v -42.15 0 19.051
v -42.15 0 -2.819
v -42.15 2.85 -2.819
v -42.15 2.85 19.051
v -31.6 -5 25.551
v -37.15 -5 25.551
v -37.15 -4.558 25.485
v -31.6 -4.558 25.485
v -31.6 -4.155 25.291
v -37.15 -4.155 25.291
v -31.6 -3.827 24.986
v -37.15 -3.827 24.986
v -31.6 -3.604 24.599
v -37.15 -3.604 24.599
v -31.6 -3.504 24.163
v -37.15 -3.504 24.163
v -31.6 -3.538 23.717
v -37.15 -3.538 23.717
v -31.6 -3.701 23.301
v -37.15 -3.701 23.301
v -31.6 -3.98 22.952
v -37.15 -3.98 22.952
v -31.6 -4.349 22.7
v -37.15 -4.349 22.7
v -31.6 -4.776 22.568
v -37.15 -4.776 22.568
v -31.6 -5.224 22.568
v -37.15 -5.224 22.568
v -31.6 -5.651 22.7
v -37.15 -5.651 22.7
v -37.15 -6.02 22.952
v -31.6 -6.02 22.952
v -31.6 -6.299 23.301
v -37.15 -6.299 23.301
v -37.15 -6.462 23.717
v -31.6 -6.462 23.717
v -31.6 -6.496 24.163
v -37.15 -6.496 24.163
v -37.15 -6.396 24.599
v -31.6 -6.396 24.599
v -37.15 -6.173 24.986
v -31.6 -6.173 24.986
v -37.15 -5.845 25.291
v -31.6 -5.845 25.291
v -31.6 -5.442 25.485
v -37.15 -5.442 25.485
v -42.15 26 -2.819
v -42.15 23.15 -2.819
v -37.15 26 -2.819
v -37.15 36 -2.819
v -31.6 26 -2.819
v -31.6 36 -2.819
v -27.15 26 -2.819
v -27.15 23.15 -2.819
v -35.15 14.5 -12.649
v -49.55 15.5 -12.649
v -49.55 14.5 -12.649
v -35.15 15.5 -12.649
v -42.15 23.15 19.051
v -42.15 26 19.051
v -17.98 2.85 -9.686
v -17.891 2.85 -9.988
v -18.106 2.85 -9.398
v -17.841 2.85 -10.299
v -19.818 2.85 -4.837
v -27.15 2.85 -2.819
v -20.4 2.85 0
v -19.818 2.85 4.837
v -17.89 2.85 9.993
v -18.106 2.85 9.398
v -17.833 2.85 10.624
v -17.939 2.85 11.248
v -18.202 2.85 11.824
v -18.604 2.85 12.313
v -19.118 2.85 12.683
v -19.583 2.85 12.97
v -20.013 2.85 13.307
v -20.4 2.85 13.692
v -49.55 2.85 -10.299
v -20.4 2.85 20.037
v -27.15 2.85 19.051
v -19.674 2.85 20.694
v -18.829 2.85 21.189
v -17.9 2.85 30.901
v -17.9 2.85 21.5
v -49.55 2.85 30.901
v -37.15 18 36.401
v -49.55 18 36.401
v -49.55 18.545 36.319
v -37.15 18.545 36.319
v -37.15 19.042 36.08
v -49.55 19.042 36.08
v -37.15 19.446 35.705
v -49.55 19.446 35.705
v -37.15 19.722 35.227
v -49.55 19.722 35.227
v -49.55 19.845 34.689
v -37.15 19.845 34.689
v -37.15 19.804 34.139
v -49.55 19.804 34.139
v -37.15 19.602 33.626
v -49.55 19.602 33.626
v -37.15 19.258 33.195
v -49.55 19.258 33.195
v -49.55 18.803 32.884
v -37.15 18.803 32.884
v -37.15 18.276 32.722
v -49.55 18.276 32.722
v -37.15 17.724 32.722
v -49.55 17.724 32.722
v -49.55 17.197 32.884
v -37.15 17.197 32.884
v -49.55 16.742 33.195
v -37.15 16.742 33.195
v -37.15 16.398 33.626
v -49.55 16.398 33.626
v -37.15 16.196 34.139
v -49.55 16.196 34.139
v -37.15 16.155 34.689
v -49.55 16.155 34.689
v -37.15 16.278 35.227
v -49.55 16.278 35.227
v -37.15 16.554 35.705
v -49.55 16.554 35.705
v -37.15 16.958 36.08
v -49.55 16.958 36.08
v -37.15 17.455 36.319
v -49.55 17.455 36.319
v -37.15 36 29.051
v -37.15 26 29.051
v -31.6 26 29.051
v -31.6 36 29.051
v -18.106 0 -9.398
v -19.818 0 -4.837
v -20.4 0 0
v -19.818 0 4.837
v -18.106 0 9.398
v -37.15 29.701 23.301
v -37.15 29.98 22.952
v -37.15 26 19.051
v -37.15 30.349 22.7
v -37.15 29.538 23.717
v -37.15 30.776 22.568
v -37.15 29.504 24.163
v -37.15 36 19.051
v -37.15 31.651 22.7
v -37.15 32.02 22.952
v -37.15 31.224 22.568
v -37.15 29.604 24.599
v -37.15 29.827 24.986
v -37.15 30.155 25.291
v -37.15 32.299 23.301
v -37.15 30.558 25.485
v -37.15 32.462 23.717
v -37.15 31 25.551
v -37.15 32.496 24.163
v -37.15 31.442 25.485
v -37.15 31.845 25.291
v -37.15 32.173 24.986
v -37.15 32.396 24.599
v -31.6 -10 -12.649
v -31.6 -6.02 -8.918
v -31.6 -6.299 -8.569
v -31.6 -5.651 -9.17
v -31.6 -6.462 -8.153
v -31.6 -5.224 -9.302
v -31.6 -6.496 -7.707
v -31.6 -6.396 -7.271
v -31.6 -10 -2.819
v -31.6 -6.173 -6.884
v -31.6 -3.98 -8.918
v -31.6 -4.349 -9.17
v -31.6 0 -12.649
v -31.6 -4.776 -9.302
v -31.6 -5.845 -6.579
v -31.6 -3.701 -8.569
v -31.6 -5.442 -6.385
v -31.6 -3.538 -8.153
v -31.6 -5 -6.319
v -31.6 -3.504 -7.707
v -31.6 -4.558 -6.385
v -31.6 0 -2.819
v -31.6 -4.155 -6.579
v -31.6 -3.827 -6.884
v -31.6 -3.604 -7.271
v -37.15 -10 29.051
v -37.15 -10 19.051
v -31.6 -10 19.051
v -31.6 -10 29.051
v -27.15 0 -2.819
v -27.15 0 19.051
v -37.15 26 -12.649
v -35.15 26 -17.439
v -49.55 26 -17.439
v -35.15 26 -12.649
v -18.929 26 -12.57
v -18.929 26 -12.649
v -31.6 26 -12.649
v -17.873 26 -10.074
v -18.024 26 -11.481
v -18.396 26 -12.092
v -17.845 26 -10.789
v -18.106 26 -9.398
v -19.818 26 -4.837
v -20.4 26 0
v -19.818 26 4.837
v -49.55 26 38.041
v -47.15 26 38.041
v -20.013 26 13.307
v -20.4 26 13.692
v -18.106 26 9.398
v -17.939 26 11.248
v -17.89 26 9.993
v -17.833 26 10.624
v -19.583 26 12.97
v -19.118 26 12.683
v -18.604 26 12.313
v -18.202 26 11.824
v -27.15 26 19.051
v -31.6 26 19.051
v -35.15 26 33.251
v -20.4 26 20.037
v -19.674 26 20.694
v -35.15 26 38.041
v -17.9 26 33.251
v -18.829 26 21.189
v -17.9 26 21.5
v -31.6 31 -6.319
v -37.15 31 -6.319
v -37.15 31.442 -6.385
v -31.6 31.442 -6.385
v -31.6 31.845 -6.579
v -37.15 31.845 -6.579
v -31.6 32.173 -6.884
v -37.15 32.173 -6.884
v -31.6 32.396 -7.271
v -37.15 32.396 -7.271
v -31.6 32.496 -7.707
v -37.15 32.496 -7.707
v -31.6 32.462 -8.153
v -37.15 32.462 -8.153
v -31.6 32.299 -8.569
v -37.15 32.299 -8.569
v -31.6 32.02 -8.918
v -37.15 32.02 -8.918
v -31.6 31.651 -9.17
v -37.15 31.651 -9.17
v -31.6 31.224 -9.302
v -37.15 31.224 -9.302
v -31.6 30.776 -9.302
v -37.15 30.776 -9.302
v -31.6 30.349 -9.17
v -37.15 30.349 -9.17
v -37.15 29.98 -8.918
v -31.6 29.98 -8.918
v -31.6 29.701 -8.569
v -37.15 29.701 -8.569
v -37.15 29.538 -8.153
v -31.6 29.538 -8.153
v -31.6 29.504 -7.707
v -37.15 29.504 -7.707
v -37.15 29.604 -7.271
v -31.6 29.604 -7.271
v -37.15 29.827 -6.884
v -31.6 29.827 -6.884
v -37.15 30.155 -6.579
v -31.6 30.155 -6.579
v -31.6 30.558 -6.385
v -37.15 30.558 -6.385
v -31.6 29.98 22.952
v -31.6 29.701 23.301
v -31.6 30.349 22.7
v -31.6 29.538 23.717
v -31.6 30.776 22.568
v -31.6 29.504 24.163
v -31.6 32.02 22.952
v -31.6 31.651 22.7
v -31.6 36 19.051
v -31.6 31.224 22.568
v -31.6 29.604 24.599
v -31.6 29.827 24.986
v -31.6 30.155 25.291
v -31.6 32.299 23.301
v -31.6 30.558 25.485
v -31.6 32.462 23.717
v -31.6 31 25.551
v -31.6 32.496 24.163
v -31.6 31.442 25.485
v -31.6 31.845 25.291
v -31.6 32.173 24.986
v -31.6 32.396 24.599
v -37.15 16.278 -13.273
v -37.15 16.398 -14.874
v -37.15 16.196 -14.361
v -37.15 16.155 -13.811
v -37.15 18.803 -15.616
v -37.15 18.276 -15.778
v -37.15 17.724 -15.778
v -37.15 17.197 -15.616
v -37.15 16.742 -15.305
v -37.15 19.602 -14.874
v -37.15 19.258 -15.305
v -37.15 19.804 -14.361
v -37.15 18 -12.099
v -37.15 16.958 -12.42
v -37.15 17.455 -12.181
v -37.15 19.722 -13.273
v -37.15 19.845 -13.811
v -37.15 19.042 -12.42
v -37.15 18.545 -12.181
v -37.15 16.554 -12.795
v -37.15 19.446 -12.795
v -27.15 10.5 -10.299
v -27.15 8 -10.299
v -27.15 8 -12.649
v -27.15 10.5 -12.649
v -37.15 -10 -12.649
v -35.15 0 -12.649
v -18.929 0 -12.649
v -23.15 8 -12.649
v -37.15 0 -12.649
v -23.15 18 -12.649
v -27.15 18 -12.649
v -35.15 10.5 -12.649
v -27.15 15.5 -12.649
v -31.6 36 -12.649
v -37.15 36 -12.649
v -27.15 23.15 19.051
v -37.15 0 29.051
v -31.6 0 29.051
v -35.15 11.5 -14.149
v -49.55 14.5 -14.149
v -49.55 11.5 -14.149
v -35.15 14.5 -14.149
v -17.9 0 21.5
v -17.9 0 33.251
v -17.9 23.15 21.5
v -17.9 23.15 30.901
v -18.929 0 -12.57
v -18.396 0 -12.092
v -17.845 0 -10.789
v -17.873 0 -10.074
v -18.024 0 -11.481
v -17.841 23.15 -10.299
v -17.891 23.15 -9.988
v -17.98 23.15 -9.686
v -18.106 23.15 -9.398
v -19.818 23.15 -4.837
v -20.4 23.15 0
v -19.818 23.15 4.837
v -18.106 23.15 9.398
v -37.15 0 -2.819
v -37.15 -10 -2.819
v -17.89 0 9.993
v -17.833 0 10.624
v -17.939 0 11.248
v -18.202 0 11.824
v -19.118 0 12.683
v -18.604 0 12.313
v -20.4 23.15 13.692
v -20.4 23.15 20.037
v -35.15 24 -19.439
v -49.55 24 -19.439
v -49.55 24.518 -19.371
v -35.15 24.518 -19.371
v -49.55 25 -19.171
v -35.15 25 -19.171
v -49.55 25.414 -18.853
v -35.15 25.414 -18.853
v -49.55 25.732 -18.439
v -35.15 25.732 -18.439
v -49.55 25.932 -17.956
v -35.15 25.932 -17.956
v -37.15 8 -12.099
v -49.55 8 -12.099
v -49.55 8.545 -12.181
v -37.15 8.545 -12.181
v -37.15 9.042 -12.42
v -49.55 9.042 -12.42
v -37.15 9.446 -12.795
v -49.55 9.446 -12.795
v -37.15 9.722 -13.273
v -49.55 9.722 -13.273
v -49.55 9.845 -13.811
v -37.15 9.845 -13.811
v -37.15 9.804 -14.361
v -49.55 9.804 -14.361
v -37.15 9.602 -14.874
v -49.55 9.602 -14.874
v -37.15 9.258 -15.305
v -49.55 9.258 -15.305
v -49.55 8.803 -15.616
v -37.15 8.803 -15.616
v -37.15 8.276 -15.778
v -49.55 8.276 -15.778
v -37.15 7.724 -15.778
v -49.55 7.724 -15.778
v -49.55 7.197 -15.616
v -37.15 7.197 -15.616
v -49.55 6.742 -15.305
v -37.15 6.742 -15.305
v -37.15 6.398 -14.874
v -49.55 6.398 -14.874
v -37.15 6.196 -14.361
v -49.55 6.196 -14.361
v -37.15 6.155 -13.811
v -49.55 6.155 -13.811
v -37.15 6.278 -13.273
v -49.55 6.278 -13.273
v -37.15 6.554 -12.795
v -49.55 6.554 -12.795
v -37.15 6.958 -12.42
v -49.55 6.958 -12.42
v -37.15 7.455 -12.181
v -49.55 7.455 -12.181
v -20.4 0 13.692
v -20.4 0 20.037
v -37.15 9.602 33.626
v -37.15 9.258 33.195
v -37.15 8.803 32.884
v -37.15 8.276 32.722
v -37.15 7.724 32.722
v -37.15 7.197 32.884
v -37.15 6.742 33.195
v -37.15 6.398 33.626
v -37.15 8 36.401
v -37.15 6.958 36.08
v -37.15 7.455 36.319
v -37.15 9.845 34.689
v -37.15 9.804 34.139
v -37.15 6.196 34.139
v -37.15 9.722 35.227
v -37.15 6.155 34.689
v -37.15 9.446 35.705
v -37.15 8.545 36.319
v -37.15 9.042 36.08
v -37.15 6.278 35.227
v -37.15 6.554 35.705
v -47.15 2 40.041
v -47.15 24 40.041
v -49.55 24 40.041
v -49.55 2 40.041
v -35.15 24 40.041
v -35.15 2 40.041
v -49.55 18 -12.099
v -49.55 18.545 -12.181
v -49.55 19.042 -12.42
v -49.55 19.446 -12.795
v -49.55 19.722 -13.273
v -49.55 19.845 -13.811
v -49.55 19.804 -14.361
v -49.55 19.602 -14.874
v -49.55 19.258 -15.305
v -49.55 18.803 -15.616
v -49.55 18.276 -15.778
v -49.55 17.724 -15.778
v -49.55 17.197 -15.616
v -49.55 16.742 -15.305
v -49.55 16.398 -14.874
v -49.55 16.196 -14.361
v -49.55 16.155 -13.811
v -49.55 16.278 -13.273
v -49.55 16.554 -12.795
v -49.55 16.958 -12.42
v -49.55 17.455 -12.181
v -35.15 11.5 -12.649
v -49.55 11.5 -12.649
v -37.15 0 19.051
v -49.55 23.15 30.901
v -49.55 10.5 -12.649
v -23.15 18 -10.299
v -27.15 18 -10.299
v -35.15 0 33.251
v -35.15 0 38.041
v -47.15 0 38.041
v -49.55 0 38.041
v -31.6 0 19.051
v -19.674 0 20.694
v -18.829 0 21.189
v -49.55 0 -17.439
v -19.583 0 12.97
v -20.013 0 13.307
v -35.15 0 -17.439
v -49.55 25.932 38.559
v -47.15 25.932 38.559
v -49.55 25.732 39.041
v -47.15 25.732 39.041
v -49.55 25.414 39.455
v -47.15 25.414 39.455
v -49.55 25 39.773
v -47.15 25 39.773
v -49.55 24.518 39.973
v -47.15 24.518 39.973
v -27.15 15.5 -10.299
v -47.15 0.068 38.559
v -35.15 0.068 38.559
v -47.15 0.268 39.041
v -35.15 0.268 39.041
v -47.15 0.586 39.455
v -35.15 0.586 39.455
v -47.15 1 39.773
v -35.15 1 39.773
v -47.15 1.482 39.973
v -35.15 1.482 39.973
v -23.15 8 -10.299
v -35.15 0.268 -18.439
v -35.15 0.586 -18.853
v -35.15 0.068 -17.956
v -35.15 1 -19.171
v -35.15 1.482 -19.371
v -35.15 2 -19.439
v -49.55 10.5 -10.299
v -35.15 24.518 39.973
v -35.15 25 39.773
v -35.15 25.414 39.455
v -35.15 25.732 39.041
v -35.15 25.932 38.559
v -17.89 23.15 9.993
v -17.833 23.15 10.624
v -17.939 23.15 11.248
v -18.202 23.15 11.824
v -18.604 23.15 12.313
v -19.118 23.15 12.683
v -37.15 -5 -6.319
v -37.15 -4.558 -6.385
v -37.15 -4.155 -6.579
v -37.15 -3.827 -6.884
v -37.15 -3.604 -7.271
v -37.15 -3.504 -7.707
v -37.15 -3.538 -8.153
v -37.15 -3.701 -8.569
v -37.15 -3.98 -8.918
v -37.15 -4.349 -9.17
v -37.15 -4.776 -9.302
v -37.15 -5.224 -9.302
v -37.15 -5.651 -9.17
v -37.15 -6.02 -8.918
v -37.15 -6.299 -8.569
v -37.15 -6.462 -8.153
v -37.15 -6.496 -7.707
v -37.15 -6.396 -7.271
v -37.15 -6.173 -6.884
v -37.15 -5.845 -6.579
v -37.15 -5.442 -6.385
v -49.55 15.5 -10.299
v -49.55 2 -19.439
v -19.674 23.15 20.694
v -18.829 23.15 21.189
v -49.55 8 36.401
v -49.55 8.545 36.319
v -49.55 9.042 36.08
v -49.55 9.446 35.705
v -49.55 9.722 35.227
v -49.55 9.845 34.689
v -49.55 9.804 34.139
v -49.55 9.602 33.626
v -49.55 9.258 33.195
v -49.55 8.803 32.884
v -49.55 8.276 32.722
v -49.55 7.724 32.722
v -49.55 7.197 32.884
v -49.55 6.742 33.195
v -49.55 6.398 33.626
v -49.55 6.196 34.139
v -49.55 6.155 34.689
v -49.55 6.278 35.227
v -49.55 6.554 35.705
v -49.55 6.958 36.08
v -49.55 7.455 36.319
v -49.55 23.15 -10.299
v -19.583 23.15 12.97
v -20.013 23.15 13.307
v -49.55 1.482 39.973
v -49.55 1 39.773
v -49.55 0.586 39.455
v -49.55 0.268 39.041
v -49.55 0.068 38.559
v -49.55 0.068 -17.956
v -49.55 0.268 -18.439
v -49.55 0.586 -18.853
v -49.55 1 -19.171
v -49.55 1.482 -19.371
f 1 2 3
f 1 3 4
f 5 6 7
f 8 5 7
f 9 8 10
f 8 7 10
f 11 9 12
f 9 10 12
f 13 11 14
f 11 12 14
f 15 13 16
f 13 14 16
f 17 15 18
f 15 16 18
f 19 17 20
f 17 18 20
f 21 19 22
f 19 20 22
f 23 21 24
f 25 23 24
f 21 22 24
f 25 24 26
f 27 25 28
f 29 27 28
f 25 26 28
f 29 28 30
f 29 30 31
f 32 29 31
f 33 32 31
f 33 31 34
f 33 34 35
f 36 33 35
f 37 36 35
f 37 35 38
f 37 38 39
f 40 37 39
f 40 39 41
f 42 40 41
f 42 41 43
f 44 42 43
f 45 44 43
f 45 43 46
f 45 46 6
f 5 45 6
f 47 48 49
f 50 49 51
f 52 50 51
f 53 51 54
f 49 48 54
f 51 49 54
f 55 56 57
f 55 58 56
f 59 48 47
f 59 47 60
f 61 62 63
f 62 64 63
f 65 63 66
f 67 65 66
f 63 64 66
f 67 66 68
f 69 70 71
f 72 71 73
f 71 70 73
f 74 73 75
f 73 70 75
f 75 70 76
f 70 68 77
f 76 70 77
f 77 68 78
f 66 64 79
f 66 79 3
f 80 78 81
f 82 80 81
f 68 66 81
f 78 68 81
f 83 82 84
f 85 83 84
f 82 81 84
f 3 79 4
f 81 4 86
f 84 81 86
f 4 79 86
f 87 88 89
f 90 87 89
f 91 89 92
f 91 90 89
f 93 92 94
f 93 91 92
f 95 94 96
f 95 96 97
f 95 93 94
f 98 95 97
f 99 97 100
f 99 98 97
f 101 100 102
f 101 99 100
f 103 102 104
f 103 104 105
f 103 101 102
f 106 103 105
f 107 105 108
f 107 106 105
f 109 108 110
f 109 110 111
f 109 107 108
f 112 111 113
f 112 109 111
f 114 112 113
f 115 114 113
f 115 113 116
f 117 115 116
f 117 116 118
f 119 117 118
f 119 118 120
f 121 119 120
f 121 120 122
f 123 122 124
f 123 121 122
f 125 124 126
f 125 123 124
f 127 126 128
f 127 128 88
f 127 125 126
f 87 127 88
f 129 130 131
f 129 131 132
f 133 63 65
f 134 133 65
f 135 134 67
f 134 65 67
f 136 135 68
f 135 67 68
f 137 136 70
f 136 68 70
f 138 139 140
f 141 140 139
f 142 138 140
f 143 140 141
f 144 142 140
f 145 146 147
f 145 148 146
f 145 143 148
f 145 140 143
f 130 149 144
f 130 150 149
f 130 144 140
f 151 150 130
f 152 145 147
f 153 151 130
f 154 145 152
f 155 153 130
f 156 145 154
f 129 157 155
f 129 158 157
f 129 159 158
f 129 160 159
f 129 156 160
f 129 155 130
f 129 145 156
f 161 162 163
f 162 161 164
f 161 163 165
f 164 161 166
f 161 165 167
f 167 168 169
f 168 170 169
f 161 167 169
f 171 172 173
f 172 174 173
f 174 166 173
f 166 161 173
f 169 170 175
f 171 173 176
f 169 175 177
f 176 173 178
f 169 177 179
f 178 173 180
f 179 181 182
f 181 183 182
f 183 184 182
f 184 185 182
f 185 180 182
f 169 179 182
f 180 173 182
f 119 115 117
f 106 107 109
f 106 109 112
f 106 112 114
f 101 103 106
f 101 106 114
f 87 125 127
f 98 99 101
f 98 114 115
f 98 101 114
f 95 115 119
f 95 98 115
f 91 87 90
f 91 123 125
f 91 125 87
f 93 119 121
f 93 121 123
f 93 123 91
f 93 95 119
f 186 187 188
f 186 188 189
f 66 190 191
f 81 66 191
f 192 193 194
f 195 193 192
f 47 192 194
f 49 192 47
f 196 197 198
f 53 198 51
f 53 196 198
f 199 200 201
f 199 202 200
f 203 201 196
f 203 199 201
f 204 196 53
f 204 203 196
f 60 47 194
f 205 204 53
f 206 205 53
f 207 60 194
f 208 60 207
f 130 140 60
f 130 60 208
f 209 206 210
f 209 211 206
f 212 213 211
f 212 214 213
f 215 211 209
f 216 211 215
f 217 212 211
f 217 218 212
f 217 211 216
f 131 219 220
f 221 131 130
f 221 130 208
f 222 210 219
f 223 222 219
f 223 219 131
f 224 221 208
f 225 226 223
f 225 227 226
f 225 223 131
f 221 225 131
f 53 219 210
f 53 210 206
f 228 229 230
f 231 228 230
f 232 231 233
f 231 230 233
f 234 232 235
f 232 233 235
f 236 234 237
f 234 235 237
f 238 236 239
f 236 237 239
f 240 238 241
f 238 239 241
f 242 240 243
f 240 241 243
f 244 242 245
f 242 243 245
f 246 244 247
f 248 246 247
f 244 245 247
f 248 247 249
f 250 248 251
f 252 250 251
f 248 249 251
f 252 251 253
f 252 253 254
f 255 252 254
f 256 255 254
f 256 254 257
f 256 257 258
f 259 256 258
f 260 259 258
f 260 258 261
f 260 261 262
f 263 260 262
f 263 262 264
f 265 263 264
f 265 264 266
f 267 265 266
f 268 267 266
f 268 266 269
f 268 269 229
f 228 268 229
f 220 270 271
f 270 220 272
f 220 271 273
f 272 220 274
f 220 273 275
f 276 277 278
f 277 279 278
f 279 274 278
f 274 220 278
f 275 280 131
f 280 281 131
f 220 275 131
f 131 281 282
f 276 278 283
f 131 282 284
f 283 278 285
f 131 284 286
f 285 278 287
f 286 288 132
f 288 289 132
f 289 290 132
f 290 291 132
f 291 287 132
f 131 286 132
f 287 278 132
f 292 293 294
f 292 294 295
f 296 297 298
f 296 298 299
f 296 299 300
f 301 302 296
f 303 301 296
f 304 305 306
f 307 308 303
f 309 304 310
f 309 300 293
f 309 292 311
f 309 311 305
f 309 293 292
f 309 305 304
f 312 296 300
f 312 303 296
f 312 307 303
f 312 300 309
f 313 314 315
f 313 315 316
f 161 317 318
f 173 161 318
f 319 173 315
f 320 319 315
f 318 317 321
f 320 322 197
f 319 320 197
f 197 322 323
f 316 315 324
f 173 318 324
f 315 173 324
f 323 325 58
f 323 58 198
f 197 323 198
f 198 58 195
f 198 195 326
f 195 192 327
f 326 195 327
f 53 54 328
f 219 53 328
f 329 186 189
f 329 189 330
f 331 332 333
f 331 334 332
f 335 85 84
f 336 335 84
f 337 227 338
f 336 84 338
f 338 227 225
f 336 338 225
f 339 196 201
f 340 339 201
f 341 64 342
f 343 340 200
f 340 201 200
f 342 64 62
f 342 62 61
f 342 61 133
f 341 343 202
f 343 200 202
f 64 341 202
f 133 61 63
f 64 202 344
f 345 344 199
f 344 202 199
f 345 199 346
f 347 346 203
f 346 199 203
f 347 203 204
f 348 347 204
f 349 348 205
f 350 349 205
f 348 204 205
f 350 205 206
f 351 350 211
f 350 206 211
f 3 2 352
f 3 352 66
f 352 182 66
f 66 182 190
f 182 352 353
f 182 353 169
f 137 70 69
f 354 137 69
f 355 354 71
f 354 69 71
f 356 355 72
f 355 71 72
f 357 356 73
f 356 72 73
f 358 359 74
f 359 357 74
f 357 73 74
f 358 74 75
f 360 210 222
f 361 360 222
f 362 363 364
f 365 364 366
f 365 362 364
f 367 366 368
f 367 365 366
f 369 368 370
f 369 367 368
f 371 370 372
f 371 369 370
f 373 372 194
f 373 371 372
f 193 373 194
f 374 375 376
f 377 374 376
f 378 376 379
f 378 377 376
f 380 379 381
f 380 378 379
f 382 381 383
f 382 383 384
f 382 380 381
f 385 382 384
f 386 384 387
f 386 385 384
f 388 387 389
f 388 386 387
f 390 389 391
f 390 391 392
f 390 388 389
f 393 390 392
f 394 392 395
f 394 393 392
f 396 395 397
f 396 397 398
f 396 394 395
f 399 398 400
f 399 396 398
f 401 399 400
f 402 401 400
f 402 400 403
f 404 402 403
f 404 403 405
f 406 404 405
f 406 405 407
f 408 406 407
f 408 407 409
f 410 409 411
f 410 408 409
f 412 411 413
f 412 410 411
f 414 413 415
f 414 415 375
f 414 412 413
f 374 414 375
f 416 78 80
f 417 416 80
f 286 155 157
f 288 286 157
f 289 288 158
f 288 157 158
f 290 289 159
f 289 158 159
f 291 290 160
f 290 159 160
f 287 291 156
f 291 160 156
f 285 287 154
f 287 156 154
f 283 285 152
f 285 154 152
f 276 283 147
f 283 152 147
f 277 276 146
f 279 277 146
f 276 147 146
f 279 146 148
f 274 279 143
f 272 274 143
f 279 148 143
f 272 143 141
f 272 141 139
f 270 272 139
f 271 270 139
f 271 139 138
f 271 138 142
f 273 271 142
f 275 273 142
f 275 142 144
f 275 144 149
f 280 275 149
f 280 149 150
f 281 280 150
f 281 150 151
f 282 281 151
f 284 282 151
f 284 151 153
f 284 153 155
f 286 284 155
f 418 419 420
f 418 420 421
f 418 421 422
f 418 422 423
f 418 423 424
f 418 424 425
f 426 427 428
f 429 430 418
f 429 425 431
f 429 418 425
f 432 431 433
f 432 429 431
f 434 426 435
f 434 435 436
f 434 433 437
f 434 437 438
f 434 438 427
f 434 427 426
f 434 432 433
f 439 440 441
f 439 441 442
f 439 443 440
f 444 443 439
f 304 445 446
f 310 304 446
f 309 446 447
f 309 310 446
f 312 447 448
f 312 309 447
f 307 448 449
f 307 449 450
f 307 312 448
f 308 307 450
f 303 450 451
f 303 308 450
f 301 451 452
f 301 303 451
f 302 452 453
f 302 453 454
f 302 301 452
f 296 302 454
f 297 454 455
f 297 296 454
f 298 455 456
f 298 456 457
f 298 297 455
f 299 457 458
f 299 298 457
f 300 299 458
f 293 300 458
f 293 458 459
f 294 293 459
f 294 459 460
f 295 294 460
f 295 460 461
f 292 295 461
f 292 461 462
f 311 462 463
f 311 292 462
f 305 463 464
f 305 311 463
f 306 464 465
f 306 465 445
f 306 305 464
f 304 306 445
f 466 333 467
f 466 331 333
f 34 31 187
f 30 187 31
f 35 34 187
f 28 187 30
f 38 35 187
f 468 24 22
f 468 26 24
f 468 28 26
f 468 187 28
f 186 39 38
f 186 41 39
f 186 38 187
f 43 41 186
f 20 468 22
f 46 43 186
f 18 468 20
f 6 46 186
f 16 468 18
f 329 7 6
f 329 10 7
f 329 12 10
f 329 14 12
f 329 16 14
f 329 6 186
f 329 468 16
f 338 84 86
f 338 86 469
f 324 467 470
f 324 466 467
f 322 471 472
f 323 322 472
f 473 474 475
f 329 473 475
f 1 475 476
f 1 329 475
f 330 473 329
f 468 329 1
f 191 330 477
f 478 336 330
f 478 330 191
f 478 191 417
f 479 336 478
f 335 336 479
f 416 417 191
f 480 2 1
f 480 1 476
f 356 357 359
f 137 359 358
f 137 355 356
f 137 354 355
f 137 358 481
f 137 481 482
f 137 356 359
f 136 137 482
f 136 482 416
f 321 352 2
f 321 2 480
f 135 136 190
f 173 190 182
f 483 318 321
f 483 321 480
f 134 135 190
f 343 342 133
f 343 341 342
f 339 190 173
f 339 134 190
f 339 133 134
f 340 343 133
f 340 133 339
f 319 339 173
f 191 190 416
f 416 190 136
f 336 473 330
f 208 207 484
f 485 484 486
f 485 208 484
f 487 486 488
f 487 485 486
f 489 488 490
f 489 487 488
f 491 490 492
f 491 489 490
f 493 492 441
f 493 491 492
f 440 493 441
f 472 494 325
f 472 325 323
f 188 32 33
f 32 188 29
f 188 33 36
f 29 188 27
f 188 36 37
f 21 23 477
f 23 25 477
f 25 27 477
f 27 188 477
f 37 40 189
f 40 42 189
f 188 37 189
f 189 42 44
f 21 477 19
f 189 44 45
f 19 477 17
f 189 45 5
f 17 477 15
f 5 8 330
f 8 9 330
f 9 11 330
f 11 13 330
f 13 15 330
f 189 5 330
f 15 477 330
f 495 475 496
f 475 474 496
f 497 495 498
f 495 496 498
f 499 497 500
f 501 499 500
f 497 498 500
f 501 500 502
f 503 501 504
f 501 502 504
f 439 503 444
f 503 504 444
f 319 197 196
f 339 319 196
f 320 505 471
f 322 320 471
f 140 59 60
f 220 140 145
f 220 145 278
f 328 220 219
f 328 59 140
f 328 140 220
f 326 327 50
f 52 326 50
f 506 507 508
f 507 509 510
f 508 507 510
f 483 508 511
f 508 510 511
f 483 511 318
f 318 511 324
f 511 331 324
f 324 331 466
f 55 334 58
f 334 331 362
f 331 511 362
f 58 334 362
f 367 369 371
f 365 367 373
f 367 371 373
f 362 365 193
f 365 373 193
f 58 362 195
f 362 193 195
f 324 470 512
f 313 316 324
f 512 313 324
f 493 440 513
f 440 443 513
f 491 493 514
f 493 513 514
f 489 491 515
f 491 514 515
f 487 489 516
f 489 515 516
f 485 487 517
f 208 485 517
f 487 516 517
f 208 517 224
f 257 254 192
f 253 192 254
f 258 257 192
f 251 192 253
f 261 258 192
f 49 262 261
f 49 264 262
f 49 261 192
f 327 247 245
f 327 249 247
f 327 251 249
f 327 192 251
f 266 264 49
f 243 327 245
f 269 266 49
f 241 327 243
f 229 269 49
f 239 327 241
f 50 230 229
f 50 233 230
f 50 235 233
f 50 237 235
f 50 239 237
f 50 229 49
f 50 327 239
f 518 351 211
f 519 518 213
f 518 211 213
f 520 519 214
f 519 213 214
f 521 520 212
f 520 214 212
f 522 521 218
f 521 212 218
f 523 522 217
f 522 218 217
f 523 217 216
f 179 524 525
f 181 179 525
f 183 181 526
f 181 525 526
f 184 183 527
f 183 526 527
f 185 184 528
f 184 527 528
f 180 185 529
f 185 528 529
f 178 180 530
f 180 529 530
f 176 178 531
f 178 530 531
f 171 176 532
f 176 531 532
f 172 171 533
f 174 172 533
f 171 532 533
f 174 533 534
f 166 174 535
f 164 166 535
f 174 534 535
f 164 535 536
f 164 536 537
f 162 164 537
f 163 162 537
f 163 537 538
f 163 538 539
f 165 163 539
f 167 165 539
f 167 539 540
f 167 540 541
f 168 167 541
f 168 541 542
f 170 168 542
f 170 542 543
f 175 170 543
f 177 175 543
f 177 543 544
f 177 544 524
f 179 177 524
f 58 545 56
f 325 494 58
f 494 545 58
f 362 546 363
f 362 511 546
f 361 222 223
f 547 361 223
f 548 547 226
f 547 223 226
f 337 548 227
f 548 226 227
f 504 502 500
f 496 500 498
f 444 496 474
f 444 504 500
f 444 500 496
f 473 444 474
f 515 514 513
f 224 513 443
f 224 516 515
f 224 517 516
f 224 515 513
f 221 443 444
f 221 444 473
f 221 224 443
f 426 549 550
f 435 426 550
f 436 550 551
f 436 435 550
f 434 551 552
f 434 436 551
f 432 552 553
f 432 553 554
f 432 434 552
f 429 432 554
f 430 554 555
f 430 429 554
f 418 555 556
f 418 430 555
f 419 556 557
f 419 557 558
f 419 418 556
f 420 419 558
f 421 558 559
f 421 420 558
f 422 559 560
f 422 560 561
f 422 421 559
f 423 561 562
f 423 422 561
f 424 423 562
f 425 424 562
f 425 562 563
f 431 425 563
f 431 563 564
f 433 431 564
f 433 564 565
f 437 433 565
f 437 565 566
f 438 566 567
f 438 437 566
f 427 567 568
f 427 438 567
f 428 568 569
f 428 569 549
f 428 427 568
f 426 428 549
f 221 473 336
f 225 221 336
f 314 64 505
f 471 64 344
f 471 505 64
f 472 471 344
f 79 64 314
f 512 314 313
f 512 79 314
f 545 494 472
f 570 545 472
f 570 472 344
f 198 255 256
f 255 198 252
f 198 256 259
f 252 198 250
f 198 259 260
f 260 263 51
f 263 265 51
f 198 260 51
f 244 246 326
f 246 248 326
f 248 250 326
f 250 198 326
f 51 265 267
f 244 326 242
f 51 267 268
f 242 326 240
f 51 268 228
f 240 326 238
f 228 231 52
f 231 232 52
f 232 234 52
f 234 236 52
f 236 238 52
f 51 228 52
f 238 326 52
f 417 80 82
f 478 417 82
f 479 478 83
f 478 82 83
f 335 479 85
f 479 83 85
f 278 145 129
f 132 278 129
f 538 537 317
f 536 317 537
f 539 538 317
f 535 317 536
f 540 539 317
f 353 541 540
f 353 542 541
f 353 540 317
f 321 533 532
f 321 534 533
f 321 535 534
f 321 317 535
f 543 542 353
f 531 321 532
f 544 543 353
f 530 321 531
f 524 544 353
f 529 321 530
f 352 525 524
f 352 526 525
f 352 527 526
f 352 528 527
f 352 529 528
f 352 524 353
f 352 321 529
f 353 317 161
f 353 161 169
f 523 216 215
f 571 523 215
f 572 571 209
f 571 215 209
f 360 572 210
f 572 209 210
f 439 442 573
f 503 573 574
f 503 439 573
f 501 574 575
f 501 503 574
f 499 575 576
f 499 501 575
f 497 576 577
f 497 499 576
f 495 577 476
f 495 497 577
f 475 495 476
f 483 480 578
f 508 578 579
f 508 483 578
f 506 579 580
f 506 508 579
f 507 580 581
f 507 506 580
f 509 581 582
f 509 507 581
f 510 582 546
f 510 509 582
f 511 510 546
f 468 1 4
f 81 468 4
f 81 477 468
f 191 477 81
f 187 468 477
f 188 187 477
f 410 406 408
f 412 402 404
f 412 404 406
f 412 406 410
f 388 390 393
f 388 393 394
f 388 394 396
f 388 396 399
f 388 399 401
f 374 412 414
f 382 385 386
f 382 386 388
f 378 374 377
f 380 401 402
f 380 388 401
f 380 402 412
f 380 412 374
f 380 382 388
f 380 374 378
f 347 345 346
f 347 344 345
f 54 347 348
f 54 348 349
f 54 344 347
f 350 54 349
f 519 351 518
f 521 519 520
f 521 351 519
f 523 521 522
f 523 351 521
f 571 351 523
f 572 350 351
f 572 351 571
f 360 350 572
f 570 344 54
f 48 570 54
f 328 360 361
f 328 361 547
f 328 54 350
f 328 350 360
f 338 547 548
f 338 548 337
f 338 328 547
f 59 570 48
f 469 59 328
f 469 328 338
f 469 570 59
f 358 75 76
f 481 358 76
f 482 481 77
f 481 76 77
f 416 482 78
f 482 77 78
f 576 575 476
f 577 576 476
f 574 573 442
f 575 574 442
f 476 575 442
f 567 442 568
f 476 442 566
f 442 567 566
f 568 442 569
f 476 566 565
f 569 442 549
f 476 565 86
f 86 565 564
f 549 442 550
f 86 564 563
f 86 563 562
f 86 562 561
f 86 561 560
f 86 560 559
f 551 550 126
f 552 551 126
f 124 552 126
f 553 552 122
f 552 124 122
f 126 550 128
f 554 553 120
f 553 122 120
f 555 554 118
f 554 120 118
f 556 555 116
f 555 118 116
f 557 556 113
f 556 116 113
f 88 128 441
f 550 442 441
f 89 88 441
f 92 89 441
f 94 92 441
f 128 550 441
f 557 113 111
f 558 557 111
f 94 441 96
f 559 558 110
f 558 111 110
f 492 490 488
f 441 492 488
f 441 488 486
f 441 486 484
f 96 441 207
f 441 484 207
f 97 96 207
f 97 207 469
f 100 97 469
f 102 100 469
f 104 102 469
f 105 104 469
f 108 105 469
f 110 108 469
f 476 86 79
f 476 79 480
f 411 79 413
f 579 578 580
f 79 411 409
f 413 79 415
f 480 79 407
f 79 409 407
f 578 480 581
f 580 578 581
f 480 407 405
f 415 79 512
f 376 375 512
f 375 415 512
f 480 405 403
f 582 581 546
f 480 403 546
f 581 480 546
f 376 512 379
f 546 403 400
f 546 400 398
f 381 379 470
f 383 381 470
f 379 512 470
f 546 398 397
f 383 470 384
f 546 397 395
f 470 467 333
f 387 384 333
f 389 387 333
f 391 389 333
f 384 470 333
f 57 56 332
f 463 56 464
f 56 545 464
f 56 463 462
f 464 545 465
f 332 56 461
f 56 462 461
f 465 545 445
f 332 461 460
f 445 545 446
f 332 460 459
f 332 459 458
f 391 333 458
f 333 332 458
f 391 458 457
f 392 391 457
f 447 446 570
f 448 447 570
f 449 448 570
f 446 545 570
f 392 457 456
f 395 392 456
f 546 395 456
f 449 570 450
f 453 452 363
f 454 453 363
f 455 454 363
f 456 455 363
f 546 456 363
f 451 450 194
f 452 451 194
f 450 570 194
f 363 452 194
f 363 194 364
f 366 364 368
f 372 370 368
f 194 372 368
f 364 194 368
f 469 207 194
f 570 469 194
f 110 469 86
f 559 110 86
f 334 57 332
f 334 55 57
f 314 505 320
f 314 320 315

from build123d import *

# Parameters (mm, degrees)
EXTRUDE_1_DEPTH          = 3
PATTERN_LINEAR_2_COUNT   = 2
PATTERN_LINEAR_2_PITCH   = 23
EXTRUDE_2_DEPTH          = 26
SKETCH_3_R               = 1.85
CUT_EXTRUDE_1_DEPTH      = 10
CUT_EXTRUDE_2_DEPTH      = 24
CUT_EXTRUDE_START        = -2.5
SKETCH_5_W               = 4
SKETCH_5_H               = 10
CUT_EXTRUDE_3_DEPTH      = 2.5
FILLET_3_R               = 2
EXTRUDE_START            = -10
SKETCH_7_W               = 9.83
SKETCH_7_H               = 10
SKETCH_7_W_2             = 10
EXTRUDE_4_DEPTH          = 5.55
CUT_EXTRUDE_4_REACH      = 21.469
SKETCH_8_R               = 1.5
SKETCH_10_W              = 15
SKETCH_10_H              = 21.87
CUT_EXTRUDE_5_DEPTH      = 37
CUT_EXTRUDE_6_DEPTH      = 11
CUT_EXTRUDE_6_DEPTH_BACK = 37
SKETCH_12_R              = 1.85
EXTRUDE_5_DEPTH          = 2.4
SKETCH_13_W              = 10.554856858
SKETCH_13_H              = 20
CUT_EXTRUDE_7_DEPTH      = 3.419156865
SKETCH_14_W              = 41.2
SKETCH_14_H              = 20.3
CUT_EXTRUDE_8_DEPTH      = 32.719156865


with BuildPart() as part:
    # Эскиз1 → Бобышка-Вытянуть1 (new body)
    with BuildSketch(Plane(origin=(0, 0, 0), x_dir=(1, 0, 0), z_dir=(0, 1, 0))):
        with BuildLine():
            Line((-47.15, 10.148849956), (-17.708435007, 10.148849956))
            ThreePointArc((-17.708435007, 10.148849956), (-17.806599121, 9.727806242), (-17.973176083, 9.328849956))
            ThreePointArc((-17.973176083, 9.328849956), (-20.25, 0), (-17.973176083, -9.328849956))
            ThreePointArc((-17.973176083, -9.328849956), (-17.79606457, -11.292053253), (-19.04716249, -12.815302961))
            ThreePointArc((-19.04716249, -12.815302961), (-19.687557209, -13.232647403), (-20.25, -13.750276505))
            Line((-20.25, -13.750276505), (-20.25, -30.751150044))
            Line((-20.25, -30.751150044), (-47.15, -30.751150044))
            Line((-47.15, -30.751150044), (-47.15, 10.148849956))
        make_face()
    extrude(amount=EXTRUDE_1_DEPTH)


with BuildPart() as pattern_linear_2_1:
    # Линейный массив2: pattern copy
    add(part.part.moved(Location(Vector(0, 1, 0) * (1 * PATTERN_LINEAR_2_PITCH))))


with BuildPart() as part_1:
    add(part.part)

    add(pattern_linear_2_1.part)  # Бобышка-Вытянуть2 merges Линейный массив2_1
    # Эскиз2 → Бобышка-Вытянуть2 (add, through all)
    with BuildSketch(Plane(origin=(0, 26, 0), x_dir=(1, 0, 0), z_dir=(0, 1, 0))):
        with BuildLine():
            ThreePointArc((-18.778786242, 12.648849956), (-17.890693286, 11.549948159), (-17.708435007, 10.148849956))
            Line((-17.708435007, 10.148849956), (-47.15, 10.148849956))
            Line((-47.15, 10.148849956), (-47.15, 19.438849956))
            Line((-47.15, 19.438849956), (-35.15, 19.438849956))
            Line((-35.15, 19.438849956), (-35.15, 12.648849956))
            Line((-35.15, 12.648849956), (-18.778786242, 12.648849956))
        make_face()
        with BuildLine():
            Line((-20.25, -19.978716958), (-20.25, -30.751150044))
            Line((-20.25, -30.751150044), (-47.15, -30.751150044))
            Line((-47.15, -30.751150044), (-47.15, -40.041150044))
            Line((-47.15, -40.041150044), (-35.15, -40.041150044))
            Line((-35.15, -40.041150044), (-35.15, -33.251150044))
            Line((-35.15, -33.251150044), (-17.75, -33.251150044))
            Line((-17.75, -33.251150044), (-17.75, -21.378462168))
            ThreePointArc((-17.75, -21.378462168), (-19.111760818, -20.878198779), (-20.25, -19.978716958))
        make_face()
    extrude(amount=-EXTRUDE_2_DEPTH)

    # Эскиз3 → Вырез-Вытянуть1 (cut)
    with BuildSketch(Plane.ZY.offset(47.15)):
        with Locations((-13.948849956, 8)):
            Circle(SKETCH_3_R)
        with Locations((-13.948849956, 18)):
            Circle(SKETCH_3_R)
        with Locations((34.551150044, 18)):
            Circle(SKETCH_3_R)
        with Locations((34.551150044, 8)):
            Circle(SKETCH_3_R)
    extrude(amount=-CUT_EXTRUDE_1_DEPTH, mode=Mode.SUBTRACT)

    # Эскиз4 → Вырез-Вытянуть2 (cut)
    with BuildSketch(Plane.ZY.offset(47.15)):
        Polygon((-10.148849956, 15.5), (-12.648849956, 15.5), (-12.648849956, 14.5), (-14.148849956, 14.5), (-14.148849956, 11.5), (-12.648849956, 11.5), (-12.648849956, 10.5), (-10.148849956, 10.5), align=None)
    extrude(amount=-CUT_EXTRUDE_2_DEPTH, mode=Mode.SUBTRACT)

    # Эскиз5 → Вырез-Вытянуть3 (cut)
    with BuildSketch(Plane(origin=(0, 0, -12.648849956), x_dir=(-1, 0, 0), z_dir=(0, 0, -1)).offset(CUT_EXTRUDE_START)):
        with Locations((25.15, 13)):
            Rectangle(SKETCH_5_W, SKETCH_5_H)
    extrude(amount=CUT_EXTRUDE_3_DEPTH, mode=Mode.SUBTRACT)

    # Скругление3
    fillet_3_edges = [part_1.edges().sort_by_distance(p)[0] for p in [
        (-41.15, 26, -19.438849956),
        (-41.15, 0, -19.438849956),
        (-41.15, 0, 40.041150044),
        (-41.15, 26, 40.041150044),
    ]]
    fillet(fillet_3_edges, radius=FILLET_3_R)

    # Эскиз7 → Бобышка-Вытянуть4 (add)
    with BuildSketch(Plane.ZY.offset(47.15).offset(EXTRUDE_START)):
        with Locations((-7.733849956, 31)):
            Rectangle(SKETCH_7_W, SKETCH_7_H)
        with Locations((24.051150044, 31)):
            Rectangle(SKETCH_7_W_2, SKETCH_7_H)
        with Locations((-7.733849956, -5)):
            Rectangle(SKETCH_7_W, SKETCH_7_H)
        with Locations((24.051150044, -5)):
            Rectangle(SKETCH_7_W_2, SKETCH_7_H)
    extrude(amount=-EXTRUDE_4_DEPTH)

    # Эскиз8 → Вырез-Вытянуть4 (cut, up to next)
    with BuildSketch(Plane.ZY.offset(37.15), mode=Mode.PRIVATE) as cut_extrude_4_sk1:
        with Locations((-7.818849956, -5)):
            Circle(SKETCH_8_R)
    cut_extrude_4_tool1 = extrude(cut_extrude_4_sk1.sketch, amount=-CUT_EXTRUDE_4_REACH, mode=Mode.PRIVATE) & part_1.part
    add(cut_extrude_4_tool1.solids().sort_by_distance((-37.15, -5, -7.81885))[0], mode=Mode.SUBTRACT)
    # Эскиз8 → Вырез-Вытянуть4 (cut, up to next)
    with BuildSketch(Plane.ZY.offset(37.15), mode=Mode.PRIVATE) as cut_extrude_4_sk2:
        with Locations((-7.818849956, 31)):
            Circle(SKETCH_8_R)
    cut_extrude_4_tool2 = extrude(cut_extrude_4_sk2.sketch, amount=-CUT_EXTRUDE_4_REACH, mode=Mode.PRIVATE) & part_1.part
    add(cut_extrude_4_tool2.solids().sort_by_distance((-37.15, 31, -7.81885))[0], mode=Mode.SUBTRACT)
    # Эскиз8 → Вырез-Вытянуть4 (cut, up to next)
    with BuildSketch(Plane.ZY.offset(37.15), mode=Mode.PRIVATE) as cut_extrude_4_sk3:
        with Locations((24.051150044, 31)):
            Circle(SKETCH_8_R)
    cut_extrude_4_tool3 = extrude(cut_extrude_4_sk3.sketch, amount=-CUT_EXTRUDE_4_REACH, mode=Mode.PRIVATE) & part_1.part
    add(cut_extrude_4_tool3.solids().sort_by_distance((-37.15, 31, 24.05115))[0], mode=Mode.SUBTRACT)
    # Эскиз8 → Вырез-Вытянуть4 (cut, up to next)
    with BuildSketch(Plane.ZY.offset(37.15), mode=Mode.PRIVATE) as cut_extrude_4_sk4:
        with Locations((24.051150044, -5)):
            Circle(SKETCH_8_R)
    cut_extrude_4_tool4 = extrude(cut_extrude_4_sk4.sketch, amount=-CUT_EXTRUDE_4_REACH, mode=Mode.PRIVATE) & part_1.part
    add(cut_extrude_4_tool4.solids().sort_by_distance((-37.15, -5, 24.05115))[0], mode=Mode.SUBTRACT)

    # Эскиз10 → Вырез-Вытянуть5 (cut, through all)
    with BuildSketch(Plane.XZ):
        with Locations((-34.65, 8.116150044)):
            Rectangle(SKETCH_10_W, SKETCH_10_H)
    extrude(amount=-CUT_EXTRUDE_5_DEPTH, mode=Mode.SUBTRACT)

    # Эскиз11 → Вырез-Вытянуть6 (cut, two sides)
    with BuildSketch(Plane(origin=(0, 26, 0), x_dir=(1, 0, 0), z_dir=(0, 1, 0))) as cut_extrude_6_sk:
        with BuildLine():
            Line((-17.75, -33.251150044), (-17.75, -21.378462168))
            ThreePointArc((-17.75, -21.378462168), (-19.111760818, -20.878198779), (-20.25, -19.978716958))
            Line((-20.25, -19.978716958), (-20.25, -13.750276505))
            ThreePointArc((-20.25, -13.750276505), (-19.687557209, -13.232647403), (-19.04716249, -12.815302961))
            ThreePointArc((-19.04716249, -12.815302961), (-17.79606457, -11.292053253), (-17.973176083, -9.328849956))
            ThreePointArc((-17.973176083, -9.328849956), (-20.25, 0), (-17.973176083, 9.328849956))
            ThreePointArc((-17.973176083, 9.328849956), (-17.754165646, 11.139735768), (-18.778786242, 12.648849956))
            Line((-18.778786242, 12.648849956), (-18.928786242, 12.648849956))
            Line((-18.928786242, 12.648849956), (-18.928786242, 12.569773384))
            ThreePointArc((-18.928786242, 12.569773384), (-17.909278274, 11.141591723), (-18.10631072, 9.397952548))
            ThreePointArc((-18.10631072, 9.397952548), (-20.4, 0), (-18.10631072, -9.397952548))
            ThreePointArc((-18.10631072, -9.397952548), (-17.939417179, -11.247894117), (-19.118336373, -12.683264034))
            ThreePointArc((-19.118336373, -12.683264034), (-19.80280754, -13.132362008), (-20.4, -13.6923182))
            Line((-20.4, -13.6923182), (-20.4, -20.036675263))
            ThreePointArc((-20.4, -20.036675263), (-19.264296699, -20.963699107), (-17.9, -21.500252655))
            Line((-17.9, -21.500252655), (-17.9, -33.251150044))
            Line((-17.9, -33.251150044), (-17.75, -33.251150044))
        make_face()
    extrude(amount=CUT_EXTRUDE_6_DEPTH, mode=Mode.SUBTRACT)
    extrude(cut_extrude_6_sk.sketch, amount=-CUT_EXTRUDE_6_DEPTH_BACK, mode=Mode.SUBTRACT)

    # Эскиз12 → Бобышка-Вытянуть5 (add)
    with BuildSketch(Plane.ZY.offset(47.15)):
        with BuildLine():
            Line((-17.438849956, 26), (38.041150044, 26))
            ThreePointArc((38.041150044, 26), (39.455363607, 25.414213562), (40.041150044, 24))
            Line((40.041150044, 24), (40.041150044, 2))
            ThreePointArc((40.041150044, 2), (39.455363607, 0.585786438), (38.041150044, 0))
            Line((38.041150044, 0), (-17.438849956, 0))
            ThreePointArc((-17.438849956, 0), (-18.853063518, 0.585786438), (-19.438849956, 2))
            Line((-19.438849956, 2), (-19.438849956, 24))
            ThreePointArc((-19.438849956, 24), (-18.853063518, 25.414213562), (-17.438849956, 26))
        make_face()
        with Locations((34.551150044, 18)):
            Circle(SKETCH_12_R, mode=Mode.SUBTRACT)
        with Locations((-13.948849956, 18)):
            Circle(SKETCH_12_R, mode=Mode.SUBTRACT)
        with Locations((-13.948849956, 8)):
            Circle(SKETCH_12_R, mode=Mode.SUBTRACT)
        with Locations((34.551150044, 8)):
            Circle(SKETCH_12_R, mode=Mode.SUBTRACT)
        Polygon((-10.148849956, 23), (-10.148849956, 15.5), (-12.648849956, 15.5), (-12.648849956, 14.5), (-14.148849956, 14.5), (-14.148849956, 11.5), (-12.648849956, 11.5), (-12.648849956, 10.5), (-10.148849956, 10.5), (-10.148849956, 3), (30.751150044, 3), (30.751150044, 23), align=None, mode=Mode.SUBTRACT)
    extrude(amount=EXTRUDE_5_DEPTH)

    # Эскиз13 → Вырез-Вытянуть7 (cut, through all)
    with BuildSketch(Plane.ZY.offset(20.25)):
        with Locations((25.473721615, 13)):
            Rectangle(SKETCH_13_W, SKETCH_13_H)
    extrude(amount=-CUT_EXTRUDE_7_DEPTH, mode=Mode.SUBTRACT)

    # Эскиз14 → Вырез-Вытянуть8 (cut, through all)
    with BuildSketch(Plane.ZY.offset(49.55)):
        with Locations((10.301150044, 13)):
            Rectangle(SKETCH_14_W, SKETCH_14_H)
    extrude(amount=-CUT_EXTRUDE_8_DEPTH, mode=Mode.SUBTRACT)


solid = part_1.part
